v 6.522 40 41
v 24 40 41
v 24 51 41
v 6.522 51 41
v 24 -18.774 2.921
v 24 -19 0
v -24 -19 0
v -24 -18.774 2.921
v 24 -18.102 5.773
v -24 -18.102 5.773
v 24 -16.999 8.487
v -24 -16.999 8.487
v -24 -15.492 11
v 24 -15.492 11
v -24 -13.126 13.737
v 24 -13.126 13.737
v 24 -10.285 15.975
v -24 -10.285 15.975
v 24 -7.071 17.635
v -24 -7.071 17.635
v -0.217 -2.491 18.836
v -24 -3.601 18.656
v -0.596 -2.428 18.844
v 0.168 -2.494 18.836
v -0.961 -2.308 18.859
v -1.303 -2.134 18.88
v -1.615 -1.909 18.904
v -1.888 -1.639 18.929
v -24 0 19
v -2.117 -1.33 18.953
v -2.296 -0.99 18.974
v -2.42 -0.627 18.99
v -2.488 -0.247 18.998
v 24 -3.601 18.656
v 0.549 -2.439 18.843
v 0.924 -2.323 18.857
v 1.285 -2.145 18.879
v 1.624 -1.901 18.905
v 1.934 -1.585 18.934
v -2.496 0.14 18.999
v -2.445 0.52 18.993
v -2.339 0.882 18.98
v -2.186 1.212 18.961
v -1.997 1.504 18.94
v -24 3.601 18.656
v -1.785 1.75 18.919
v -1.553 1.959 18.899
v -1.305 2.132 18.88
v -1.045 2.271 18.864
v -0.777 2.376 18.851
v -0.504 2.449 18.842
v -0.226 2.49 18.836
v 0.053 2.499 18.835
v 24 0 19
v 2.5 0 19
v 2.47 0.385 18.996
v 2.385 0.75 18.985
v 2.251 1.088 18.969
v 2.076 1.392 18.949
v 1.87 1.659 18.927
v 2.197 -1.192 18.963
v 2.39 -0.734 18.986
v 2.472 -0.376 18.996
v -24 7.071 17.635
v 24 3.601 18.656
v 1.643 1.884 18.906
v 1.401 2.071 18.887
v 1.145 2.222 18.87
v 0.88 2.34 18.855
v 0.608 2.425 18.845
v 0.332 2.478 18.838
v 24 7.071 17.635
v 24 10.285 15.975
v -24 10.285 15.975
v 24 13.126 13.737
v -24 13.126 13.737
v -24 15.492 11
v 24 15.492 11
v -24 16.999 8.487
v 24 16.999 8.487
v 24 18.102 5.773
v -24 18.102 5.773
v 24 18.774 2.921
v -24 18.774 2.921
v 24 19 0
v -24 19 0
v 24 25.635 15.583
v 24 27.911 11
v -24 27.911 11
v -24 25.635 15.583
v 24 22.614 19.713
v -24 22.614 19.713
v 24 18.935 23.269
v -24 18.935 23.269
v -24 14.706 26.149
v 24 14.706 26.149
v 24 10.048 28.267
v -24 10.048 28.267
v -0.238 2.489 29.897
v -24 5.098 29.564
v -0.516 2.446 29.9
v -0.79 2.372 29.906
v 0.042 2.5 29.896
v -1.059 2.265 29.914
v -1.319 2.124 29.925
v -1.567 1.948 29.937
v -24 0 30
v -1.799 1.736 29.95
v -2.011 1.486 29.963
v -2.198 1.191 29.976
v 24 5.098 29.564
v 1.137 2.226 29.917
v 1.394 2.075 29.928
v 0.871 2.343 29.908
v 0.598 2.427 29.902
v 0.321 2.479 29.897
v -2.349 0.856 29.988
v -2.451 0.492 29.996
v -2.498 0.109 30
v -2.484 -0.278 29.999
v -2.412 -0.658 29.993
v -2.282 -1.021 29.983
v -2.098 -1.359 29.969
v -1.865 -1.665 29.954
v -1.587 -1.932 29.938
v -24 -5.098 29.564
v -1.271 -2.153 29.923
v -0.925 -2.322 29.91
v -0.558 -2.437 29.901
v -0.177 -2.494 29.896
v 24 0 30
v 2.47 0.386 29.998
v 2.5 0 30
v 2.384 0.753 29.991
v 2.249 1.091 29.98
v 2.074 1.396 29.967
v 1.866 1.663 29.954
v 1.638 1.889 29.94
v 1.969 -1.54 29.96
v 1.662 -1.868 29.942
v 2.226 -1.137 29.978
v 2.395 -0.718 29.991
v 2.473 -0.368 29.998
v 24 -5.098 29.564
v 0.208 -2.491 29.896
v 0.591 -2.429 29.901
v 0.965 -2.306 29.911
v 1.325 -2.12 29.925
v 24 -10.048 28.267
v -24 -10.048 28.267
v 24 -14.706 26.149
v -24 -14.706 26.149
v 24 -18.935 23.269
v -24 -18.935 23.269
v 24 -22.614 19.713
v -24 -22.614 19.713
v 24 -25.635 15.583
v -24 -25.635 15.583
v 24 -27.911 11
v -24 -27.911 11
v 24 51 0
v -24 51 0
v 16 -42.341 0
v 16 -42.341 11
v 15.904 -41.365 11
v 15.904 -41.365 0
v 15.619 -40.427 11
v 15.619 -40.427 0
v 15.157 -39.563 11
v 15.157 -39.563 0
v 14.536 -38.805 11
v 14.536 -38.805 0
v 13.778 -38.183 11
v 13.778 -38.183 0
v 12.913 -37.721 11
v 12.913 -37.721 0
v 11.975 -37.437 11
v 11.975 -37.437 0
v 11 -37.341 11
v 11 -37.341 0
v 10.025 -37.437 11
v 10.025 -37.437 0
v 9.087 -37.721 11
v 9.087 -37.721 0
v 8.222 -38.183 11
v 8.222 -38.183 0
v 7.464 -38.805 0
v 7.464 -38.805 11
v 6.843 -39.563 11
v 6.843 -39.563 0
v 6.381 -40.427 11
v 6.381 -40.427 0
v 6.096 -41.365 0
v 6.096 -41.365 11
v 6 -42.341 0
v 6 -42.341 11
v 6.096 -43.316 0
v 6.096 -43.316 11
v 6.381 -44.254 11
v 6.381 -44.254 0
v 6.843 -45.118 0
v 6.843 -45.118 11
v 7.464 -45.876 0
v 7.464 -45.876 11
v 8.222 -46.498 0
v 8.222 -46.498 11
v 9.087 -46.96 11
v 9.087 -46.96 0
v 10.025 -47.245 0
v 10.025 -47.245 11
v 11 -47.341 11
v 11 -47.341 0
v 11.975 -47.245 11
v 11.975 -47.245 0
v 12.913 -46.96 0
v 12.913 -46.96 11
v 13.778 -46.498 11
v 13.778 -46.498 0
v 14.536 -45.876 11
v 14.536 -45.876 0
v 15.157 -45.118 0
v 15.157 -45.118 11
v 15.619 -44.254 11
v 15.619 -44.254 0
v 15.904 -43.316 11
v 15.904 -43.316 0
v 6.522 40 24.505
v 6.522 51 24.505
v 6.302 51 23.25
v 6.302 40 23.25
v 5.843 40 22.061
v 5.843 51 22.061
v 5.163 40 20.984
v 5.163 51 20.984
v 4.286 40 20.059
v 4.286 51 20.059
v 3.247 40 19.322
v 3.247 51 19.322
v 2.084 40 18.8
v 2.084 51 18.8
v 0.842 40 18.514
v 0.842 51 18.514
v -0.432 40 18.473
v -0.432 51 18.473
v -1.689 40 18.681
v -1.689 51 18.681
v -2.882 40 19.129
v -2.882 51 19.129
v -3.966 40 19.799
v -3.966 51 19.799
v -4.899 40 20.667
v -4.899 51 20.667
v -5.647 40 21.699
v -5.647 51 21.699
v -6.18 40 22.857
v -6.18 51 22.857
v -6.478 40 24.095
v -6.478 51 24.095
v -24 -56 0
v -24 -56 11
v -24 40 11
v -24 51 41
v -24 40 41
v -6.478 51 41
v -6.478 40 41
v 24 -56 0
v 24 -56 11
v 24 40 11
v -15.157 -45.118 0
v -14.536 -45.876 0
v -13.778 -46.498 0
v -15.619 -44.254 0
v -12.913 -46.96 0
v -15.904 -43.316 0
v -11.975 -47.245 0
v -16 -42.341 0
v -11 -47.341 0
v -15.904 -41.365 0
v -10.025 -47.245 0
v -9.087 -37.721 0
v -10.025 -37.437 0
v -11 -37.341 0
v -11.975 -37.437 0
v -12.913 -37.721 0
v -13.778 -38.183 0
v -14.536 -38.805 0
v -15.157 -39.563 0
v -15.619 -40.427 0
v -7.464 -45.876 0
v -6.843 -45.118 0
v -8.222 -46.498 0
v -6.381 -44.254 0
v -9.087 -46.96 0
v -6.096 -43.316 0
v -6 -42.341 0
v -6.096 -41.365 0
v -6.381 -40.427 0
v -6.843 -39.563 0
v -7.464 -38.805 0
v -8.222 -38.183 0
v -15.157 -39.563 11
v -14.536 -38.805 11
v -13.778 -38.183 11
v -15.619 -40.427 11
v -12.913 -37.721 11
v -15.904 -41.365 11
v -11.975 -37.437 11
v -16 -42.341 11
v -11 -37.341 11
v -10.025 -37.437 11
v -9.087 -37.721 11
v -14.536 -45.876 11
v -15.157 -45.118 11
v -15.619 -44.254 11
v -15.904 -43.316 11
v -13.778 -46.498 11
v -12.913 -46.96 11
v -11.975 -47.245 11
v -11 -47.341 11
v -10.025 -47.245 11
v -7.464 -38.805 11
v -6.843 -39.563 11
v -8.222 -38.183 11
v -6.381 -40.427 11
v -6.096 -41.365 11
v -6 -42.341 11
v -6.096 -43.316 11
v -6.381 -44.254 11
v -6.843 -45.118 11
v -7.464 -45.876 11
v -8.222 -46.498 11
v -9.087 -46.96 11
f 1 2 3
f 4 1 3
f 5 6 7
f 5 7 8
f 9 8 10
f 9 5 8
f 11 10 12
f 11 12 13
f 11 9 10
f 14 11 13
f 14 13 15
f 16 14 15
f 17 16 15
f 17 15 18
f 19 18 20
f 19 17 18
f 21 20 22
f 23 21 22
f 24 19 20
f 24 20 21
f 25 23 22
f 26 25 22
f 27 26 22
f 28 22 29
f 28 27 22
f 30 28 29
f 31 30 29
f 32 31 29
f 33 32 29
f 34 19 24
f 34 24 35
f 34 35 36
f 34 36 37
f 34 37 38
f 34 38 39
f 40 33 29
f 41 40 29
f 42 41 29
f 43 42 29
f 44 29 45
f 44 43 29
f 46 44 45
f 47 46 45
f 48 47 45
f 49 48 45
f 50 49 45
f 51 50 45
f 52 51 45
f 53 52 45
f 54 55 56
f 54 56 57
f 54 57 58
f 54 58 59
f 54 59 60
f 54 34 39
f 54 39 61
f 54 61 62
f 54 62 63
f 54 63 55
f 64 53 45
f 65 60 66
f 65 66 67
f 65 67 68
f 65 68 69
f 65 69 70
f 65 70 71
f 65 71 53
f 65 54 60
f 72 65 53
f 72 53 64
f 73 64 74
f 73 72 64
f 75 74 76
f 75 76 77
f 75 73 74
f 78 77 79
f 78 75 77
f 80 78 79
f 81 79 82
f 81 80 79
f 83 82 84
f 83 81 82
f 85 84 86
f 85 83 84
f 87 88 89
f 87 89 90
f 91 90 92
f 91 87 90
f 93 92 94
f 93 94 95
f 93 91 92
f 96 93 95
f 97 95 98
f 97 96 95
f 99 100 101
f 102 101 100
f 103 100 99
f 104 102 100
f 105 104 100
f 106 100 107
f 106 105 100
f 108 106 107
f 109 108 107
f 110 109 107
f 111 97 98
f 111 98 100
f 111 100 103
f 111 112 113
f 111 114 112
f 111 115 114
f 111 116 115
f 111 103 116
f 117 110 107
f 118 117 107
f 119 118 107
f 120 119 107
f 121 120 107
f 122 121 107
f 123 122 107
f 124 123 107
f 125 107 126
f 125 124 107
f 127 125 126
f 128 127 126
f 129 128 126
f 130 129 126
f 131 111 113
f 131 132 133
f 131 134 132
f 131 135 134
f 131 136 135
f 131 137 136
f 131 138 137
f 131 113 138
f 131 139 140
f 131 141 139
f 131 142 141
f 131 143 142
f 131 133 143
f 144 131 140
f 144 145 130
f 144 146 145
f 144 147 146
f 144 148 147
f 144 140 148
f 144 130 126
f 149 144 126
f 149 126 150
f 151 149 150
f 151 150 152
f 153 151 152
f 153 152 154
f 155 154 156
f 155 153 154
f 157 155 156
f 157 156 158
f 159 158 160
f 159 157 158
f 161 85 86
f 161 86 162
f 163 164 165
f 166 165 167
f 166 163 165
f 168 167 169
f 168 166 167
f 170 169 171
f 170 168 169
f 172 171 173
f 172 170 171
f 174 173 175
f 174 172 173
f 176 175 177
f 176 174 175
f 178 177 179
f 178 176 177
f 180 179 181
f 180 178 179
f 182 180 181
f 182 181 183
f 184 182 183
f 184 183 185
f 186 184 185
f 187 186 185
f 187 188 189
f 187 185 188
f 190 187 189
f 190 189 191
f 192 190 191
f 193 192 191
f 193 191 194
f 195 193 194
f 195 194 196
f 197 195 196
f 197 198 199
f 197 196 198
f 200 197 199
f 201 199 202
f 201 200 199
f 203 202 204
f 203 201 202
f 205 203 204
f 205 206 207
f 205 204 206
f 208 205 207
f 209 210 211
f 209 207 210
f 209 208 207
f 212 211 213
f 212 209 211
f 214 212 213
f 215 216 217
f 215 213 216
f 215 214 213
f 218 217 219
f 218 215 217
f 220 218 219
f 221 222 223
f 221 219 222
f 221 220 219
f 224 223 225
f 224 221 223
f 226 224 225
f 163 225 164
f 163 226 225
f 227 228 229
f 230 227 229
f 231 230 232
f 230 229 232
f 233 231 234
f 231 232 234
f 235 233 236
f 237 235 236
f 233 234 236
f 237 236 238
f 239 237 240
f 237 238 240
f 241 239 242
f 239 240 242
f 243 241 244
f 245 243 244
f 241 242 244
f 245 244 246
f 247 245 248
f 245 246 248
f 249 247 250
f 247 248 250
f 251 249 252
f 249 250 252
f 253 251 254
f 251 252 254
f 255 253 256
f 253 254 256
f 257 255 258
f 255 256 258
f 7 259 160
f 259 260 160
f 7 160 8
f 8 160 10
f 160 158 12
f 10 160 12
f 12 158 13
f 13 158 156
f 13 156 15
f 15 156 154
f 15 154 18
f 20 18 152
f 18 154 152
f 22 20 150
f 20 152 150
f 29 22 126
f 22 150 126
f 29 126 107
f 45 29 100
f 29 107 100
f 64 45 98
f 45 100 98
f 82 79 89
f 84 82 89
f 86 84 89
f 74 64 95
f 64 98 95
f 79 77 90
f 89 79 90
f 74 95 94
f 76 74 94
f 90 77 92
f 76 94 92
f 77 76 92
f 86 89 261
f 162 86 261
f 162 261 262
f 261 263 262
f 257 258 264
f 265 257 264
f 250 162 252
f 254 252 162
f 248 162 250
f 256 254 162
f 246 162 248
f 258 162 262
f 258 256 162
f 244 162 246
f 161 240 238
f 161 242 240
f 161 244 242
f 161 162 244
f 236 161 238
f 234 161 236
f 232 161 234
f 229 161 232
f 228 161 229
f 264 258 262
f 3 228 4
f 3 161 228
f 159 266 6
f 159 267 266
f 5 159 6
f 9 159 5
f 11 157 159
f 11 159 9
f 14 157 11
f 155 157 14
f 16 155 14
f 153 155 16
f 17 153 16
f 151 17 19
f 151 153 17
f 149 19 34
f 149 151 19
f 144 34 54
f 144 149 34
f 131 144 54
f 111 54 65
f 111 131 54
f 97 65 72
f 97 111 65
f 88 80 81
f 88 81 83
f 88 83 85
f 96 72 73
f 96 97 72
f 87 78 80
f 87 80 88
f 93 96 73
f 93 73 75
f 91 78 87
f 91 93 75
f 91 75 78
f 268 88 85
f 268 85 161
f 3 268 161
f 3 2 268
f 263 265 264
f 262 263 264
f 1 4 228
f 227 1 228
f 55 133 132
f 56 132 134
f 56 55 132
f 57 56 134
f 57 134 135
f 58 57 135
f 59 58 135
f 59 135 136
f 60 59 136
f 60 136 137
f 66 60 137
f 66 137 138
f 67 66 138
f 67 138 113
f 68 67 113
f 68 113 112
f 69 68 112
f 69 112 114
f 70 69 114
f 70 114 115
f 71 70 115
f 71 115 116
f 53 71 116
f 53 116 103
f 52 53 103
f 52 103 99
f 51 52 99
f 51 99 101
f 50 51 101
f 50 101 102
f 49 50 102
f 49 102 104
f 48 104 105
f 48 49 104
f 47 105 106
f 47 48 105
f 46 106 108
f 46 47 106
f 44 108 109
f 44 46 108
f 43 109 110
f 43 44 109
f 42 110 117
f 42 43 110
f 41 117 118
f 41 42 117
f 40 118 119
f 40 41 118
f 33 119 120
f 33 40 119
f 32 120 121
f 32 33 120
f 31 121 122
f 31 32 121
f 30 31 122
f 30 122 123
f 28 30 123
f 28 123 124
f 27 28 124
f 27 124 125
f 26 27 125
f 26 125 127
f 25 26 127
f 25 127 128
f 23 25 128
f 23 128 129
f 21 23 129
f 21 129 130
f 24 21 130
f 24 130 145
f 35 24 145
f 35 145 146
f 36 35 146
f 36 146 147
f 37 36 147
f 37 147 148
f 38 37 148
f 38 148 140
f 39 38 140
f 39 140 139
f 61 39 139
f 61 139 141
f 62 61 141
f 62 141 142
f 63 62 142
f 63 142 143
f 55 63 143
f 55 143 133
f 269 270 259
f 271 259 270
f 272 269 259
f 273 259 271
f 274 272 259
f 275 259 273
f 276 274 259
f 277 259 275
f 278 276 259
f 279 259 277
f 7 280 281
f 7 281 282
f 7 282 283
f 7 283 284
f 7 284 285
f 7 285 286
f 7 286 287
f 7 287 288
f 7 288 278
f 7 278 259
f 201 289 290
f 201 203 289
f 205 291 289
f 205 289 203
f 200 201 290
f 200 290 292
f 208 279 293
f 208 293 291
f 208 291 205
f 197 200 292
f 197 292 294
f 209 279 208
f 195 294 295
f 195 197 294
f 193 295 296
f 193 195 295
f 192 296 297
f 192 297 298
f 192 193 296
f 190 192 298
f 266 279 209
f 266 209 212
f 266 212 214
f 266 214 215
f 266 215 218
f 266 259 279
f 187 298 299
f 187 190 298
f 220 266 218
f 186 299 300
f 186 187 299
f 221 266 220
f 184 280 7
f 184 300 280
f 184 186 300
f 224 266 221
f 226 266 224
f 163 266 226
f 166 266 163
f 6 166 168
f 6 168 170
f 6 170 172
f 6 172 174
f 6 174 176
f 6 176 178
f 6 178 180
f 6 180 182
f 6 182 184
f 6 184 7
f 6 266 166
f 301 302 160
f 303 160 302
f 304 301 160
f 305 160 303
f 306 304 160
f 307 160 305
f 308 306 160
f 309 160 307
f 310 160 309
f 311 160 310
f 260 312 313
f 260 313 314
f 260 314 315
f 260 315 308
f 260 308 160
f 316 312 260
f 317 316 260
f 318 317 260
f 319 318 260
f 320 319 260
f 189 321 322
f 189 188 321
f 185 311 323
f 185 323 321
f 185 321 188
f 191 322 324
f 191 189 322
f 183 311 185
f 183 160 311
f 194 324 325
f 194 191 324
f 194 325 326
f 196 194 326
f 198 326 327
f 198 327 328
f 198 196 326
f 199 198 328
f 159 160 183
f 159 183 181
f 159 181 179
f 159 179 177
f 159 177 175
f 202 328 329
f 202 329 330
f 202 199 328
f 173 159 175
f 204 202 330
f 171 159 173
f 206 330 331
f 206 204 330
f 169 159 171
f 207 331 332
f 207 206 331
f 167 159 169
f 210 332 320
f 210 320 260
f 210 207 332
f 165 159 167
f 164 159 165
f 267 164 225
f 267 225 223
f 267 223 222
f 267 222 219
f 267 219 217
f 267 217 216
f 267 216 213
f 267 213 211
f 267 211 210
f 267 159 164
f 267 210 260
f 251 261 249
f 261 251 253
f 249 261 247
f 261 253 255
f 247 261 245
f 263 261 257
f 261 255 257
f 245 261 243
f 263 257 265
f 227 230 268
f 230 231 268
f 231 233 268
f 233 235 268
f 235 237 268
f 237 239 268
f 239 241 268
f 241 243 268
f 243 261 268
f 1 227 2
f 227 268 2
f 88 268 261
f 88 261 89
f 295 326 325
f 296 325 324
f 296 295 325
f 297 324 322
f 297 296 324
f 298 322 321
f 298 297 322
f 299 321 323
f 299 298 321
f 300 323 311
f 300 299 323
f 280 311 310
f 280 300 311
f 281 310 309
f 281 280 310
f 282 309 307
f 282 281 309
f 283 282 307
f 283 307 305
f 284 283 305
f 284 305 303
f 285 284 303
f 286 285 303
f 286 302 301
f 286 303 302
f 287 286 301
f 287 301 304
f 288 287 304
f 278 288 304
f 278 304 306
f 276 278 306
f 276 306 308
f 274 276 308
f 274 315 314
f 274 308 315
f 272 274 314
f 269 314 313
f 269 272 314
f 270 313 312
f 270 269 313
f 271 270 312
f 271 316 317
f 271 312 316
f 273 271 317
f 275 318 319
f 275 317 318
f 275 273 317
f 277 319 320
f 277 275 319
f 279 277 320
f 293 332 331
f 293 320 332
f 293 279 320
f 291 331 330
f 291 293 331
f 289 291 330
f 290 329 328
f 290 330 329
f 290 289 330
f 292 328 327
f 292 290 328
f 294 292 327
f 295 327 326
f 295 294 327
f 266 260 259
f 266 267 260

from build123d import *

# Parameters (mm, degrees)
F0_W     = 11
F0_H     = 30
F1_DEPTH = 24
F3_DEPTH = 11
F4_R     = 5
F4_R_2   = 2.5
F5_DEPTH = 41.001


with BuildPart() as f1:
    # F0 (on Right) → F1 (new body, symmetric)
    with BuildSketch(Plane.YZ):
        with BuildLine():
            Line((-56, 0), (-30, 0))
            ThreePointArc((-30, 0), (-29.4730143031, 5.5983415304), (-27.9105714739, 11))
            Line((-27.9105714739, 11), (-56, 11))
            Line((-56, 11), (-56, 0))
        make_face()
        with BuildLine():
            ThreePointArc((-27.9105714739, 11), (-29.4730143031, 5.5983415304), (-30, 0))
            Line((-30, 0), (-19, 0))
            ThreePointArc((-19, 0), (-18.1017503893, 5.7729223833), (-15.4919333848, 11))
            Line((-15.4919333848, 11), (-27.9105714739, 11))
        make_face()
        with BuildLine():
            Line((15.4919333848, 11), (27.9105714739, 11))
            ThreePointArc((27.9105714739, 11), (0, 30), (-27.9105714739, 11))
            Line((-27.9105714739, 11), (-15.4919333848, 11))
            ThreePointArc((-15.4919333848, 11), (0, 19), (15.4919333848, 11))
        make_face()
        with BuildLine():
            Line((19, 0), (30, 0))
            ThreePointArc((30, 0), (29.4730143031, 5.5983415304), (27.9105714739, 11))
            Line((27.9105714739, 11), (15.4919333848, 11))
            ThreePointArc((15.4919333848, 11), (18.1017503893, 5.7729223833), (19, 0))
        make_face()
        with BuildLine():
            ThreePointArc((27.9105714739, 11), (29.4730143031, 5.5983415304), (30, 0))
            Line((30, 0), (51, 0))
            Line((51, 0), (51, 11))
            Line((51, 11), (40, 11))
            Line((40, 11), (27.9105714739, 11))
        make_face()
        with Locations((45.5, 26)):
            Rectangle(F0_W, F0_H)
    extrude(amount=F1_DEPTH, both=True)

    # F2 (on face) → F3 (cut, through all)
    with BuildSketch(Plane(origin=(0, 51, 0), x_dir=(-1, 0, 0), z_dir=(0, 1, 0))):
        with BuildLine():
            Line((-6.5220605694, 25.4945768912), (-6.5220605694, 24.5054231088))
            ThreePointArc((-6.5220605694, 24.5054231088), (-0.2061620785, 18.4624639527), (6.4779394306, 24.0954663604))
            Line((6.4779394306, 24.0954663604), (6.4779394306, 25.9045336396))
            ThreePointArc((6.4779394306, 25.9045336396), (-0.2061620785, 31.5375360473), (-6.5220605694, 25.4945768912))
        make_face()
        with BuildLine():
            Line((-6.5220605694, 41), (-6.5220605694, 25.4945768912))
            ThreePointArc((-6.5220605694, 25.4945768912), (-0.2061620785, 31.5375360473), (6.4779394306, 25.9045336396))
            Line((6.4779394306, 25.9045336396), (6.4779394306, 41))
            Line((6.4779394306, 41), (-6.5220605694, 41))
        make_face()
    extrude(amount=-F3_DEPTH, mode=Mode.SUBTRACT)

    # F4 (on Top) → F5 (cut, through all)
    with BuildSketch(Plane.XY):
        with Locations((11, -42.3406362534)):
            Circle(F4_R)
        with Locations((-11, -42.3406362534)):
            Circle(F4_R)
        Circle(F4_R_2)
    extrude(amount=F5_DEPTH, mode=Mode.SUBTRACT)


solid = f1.part
